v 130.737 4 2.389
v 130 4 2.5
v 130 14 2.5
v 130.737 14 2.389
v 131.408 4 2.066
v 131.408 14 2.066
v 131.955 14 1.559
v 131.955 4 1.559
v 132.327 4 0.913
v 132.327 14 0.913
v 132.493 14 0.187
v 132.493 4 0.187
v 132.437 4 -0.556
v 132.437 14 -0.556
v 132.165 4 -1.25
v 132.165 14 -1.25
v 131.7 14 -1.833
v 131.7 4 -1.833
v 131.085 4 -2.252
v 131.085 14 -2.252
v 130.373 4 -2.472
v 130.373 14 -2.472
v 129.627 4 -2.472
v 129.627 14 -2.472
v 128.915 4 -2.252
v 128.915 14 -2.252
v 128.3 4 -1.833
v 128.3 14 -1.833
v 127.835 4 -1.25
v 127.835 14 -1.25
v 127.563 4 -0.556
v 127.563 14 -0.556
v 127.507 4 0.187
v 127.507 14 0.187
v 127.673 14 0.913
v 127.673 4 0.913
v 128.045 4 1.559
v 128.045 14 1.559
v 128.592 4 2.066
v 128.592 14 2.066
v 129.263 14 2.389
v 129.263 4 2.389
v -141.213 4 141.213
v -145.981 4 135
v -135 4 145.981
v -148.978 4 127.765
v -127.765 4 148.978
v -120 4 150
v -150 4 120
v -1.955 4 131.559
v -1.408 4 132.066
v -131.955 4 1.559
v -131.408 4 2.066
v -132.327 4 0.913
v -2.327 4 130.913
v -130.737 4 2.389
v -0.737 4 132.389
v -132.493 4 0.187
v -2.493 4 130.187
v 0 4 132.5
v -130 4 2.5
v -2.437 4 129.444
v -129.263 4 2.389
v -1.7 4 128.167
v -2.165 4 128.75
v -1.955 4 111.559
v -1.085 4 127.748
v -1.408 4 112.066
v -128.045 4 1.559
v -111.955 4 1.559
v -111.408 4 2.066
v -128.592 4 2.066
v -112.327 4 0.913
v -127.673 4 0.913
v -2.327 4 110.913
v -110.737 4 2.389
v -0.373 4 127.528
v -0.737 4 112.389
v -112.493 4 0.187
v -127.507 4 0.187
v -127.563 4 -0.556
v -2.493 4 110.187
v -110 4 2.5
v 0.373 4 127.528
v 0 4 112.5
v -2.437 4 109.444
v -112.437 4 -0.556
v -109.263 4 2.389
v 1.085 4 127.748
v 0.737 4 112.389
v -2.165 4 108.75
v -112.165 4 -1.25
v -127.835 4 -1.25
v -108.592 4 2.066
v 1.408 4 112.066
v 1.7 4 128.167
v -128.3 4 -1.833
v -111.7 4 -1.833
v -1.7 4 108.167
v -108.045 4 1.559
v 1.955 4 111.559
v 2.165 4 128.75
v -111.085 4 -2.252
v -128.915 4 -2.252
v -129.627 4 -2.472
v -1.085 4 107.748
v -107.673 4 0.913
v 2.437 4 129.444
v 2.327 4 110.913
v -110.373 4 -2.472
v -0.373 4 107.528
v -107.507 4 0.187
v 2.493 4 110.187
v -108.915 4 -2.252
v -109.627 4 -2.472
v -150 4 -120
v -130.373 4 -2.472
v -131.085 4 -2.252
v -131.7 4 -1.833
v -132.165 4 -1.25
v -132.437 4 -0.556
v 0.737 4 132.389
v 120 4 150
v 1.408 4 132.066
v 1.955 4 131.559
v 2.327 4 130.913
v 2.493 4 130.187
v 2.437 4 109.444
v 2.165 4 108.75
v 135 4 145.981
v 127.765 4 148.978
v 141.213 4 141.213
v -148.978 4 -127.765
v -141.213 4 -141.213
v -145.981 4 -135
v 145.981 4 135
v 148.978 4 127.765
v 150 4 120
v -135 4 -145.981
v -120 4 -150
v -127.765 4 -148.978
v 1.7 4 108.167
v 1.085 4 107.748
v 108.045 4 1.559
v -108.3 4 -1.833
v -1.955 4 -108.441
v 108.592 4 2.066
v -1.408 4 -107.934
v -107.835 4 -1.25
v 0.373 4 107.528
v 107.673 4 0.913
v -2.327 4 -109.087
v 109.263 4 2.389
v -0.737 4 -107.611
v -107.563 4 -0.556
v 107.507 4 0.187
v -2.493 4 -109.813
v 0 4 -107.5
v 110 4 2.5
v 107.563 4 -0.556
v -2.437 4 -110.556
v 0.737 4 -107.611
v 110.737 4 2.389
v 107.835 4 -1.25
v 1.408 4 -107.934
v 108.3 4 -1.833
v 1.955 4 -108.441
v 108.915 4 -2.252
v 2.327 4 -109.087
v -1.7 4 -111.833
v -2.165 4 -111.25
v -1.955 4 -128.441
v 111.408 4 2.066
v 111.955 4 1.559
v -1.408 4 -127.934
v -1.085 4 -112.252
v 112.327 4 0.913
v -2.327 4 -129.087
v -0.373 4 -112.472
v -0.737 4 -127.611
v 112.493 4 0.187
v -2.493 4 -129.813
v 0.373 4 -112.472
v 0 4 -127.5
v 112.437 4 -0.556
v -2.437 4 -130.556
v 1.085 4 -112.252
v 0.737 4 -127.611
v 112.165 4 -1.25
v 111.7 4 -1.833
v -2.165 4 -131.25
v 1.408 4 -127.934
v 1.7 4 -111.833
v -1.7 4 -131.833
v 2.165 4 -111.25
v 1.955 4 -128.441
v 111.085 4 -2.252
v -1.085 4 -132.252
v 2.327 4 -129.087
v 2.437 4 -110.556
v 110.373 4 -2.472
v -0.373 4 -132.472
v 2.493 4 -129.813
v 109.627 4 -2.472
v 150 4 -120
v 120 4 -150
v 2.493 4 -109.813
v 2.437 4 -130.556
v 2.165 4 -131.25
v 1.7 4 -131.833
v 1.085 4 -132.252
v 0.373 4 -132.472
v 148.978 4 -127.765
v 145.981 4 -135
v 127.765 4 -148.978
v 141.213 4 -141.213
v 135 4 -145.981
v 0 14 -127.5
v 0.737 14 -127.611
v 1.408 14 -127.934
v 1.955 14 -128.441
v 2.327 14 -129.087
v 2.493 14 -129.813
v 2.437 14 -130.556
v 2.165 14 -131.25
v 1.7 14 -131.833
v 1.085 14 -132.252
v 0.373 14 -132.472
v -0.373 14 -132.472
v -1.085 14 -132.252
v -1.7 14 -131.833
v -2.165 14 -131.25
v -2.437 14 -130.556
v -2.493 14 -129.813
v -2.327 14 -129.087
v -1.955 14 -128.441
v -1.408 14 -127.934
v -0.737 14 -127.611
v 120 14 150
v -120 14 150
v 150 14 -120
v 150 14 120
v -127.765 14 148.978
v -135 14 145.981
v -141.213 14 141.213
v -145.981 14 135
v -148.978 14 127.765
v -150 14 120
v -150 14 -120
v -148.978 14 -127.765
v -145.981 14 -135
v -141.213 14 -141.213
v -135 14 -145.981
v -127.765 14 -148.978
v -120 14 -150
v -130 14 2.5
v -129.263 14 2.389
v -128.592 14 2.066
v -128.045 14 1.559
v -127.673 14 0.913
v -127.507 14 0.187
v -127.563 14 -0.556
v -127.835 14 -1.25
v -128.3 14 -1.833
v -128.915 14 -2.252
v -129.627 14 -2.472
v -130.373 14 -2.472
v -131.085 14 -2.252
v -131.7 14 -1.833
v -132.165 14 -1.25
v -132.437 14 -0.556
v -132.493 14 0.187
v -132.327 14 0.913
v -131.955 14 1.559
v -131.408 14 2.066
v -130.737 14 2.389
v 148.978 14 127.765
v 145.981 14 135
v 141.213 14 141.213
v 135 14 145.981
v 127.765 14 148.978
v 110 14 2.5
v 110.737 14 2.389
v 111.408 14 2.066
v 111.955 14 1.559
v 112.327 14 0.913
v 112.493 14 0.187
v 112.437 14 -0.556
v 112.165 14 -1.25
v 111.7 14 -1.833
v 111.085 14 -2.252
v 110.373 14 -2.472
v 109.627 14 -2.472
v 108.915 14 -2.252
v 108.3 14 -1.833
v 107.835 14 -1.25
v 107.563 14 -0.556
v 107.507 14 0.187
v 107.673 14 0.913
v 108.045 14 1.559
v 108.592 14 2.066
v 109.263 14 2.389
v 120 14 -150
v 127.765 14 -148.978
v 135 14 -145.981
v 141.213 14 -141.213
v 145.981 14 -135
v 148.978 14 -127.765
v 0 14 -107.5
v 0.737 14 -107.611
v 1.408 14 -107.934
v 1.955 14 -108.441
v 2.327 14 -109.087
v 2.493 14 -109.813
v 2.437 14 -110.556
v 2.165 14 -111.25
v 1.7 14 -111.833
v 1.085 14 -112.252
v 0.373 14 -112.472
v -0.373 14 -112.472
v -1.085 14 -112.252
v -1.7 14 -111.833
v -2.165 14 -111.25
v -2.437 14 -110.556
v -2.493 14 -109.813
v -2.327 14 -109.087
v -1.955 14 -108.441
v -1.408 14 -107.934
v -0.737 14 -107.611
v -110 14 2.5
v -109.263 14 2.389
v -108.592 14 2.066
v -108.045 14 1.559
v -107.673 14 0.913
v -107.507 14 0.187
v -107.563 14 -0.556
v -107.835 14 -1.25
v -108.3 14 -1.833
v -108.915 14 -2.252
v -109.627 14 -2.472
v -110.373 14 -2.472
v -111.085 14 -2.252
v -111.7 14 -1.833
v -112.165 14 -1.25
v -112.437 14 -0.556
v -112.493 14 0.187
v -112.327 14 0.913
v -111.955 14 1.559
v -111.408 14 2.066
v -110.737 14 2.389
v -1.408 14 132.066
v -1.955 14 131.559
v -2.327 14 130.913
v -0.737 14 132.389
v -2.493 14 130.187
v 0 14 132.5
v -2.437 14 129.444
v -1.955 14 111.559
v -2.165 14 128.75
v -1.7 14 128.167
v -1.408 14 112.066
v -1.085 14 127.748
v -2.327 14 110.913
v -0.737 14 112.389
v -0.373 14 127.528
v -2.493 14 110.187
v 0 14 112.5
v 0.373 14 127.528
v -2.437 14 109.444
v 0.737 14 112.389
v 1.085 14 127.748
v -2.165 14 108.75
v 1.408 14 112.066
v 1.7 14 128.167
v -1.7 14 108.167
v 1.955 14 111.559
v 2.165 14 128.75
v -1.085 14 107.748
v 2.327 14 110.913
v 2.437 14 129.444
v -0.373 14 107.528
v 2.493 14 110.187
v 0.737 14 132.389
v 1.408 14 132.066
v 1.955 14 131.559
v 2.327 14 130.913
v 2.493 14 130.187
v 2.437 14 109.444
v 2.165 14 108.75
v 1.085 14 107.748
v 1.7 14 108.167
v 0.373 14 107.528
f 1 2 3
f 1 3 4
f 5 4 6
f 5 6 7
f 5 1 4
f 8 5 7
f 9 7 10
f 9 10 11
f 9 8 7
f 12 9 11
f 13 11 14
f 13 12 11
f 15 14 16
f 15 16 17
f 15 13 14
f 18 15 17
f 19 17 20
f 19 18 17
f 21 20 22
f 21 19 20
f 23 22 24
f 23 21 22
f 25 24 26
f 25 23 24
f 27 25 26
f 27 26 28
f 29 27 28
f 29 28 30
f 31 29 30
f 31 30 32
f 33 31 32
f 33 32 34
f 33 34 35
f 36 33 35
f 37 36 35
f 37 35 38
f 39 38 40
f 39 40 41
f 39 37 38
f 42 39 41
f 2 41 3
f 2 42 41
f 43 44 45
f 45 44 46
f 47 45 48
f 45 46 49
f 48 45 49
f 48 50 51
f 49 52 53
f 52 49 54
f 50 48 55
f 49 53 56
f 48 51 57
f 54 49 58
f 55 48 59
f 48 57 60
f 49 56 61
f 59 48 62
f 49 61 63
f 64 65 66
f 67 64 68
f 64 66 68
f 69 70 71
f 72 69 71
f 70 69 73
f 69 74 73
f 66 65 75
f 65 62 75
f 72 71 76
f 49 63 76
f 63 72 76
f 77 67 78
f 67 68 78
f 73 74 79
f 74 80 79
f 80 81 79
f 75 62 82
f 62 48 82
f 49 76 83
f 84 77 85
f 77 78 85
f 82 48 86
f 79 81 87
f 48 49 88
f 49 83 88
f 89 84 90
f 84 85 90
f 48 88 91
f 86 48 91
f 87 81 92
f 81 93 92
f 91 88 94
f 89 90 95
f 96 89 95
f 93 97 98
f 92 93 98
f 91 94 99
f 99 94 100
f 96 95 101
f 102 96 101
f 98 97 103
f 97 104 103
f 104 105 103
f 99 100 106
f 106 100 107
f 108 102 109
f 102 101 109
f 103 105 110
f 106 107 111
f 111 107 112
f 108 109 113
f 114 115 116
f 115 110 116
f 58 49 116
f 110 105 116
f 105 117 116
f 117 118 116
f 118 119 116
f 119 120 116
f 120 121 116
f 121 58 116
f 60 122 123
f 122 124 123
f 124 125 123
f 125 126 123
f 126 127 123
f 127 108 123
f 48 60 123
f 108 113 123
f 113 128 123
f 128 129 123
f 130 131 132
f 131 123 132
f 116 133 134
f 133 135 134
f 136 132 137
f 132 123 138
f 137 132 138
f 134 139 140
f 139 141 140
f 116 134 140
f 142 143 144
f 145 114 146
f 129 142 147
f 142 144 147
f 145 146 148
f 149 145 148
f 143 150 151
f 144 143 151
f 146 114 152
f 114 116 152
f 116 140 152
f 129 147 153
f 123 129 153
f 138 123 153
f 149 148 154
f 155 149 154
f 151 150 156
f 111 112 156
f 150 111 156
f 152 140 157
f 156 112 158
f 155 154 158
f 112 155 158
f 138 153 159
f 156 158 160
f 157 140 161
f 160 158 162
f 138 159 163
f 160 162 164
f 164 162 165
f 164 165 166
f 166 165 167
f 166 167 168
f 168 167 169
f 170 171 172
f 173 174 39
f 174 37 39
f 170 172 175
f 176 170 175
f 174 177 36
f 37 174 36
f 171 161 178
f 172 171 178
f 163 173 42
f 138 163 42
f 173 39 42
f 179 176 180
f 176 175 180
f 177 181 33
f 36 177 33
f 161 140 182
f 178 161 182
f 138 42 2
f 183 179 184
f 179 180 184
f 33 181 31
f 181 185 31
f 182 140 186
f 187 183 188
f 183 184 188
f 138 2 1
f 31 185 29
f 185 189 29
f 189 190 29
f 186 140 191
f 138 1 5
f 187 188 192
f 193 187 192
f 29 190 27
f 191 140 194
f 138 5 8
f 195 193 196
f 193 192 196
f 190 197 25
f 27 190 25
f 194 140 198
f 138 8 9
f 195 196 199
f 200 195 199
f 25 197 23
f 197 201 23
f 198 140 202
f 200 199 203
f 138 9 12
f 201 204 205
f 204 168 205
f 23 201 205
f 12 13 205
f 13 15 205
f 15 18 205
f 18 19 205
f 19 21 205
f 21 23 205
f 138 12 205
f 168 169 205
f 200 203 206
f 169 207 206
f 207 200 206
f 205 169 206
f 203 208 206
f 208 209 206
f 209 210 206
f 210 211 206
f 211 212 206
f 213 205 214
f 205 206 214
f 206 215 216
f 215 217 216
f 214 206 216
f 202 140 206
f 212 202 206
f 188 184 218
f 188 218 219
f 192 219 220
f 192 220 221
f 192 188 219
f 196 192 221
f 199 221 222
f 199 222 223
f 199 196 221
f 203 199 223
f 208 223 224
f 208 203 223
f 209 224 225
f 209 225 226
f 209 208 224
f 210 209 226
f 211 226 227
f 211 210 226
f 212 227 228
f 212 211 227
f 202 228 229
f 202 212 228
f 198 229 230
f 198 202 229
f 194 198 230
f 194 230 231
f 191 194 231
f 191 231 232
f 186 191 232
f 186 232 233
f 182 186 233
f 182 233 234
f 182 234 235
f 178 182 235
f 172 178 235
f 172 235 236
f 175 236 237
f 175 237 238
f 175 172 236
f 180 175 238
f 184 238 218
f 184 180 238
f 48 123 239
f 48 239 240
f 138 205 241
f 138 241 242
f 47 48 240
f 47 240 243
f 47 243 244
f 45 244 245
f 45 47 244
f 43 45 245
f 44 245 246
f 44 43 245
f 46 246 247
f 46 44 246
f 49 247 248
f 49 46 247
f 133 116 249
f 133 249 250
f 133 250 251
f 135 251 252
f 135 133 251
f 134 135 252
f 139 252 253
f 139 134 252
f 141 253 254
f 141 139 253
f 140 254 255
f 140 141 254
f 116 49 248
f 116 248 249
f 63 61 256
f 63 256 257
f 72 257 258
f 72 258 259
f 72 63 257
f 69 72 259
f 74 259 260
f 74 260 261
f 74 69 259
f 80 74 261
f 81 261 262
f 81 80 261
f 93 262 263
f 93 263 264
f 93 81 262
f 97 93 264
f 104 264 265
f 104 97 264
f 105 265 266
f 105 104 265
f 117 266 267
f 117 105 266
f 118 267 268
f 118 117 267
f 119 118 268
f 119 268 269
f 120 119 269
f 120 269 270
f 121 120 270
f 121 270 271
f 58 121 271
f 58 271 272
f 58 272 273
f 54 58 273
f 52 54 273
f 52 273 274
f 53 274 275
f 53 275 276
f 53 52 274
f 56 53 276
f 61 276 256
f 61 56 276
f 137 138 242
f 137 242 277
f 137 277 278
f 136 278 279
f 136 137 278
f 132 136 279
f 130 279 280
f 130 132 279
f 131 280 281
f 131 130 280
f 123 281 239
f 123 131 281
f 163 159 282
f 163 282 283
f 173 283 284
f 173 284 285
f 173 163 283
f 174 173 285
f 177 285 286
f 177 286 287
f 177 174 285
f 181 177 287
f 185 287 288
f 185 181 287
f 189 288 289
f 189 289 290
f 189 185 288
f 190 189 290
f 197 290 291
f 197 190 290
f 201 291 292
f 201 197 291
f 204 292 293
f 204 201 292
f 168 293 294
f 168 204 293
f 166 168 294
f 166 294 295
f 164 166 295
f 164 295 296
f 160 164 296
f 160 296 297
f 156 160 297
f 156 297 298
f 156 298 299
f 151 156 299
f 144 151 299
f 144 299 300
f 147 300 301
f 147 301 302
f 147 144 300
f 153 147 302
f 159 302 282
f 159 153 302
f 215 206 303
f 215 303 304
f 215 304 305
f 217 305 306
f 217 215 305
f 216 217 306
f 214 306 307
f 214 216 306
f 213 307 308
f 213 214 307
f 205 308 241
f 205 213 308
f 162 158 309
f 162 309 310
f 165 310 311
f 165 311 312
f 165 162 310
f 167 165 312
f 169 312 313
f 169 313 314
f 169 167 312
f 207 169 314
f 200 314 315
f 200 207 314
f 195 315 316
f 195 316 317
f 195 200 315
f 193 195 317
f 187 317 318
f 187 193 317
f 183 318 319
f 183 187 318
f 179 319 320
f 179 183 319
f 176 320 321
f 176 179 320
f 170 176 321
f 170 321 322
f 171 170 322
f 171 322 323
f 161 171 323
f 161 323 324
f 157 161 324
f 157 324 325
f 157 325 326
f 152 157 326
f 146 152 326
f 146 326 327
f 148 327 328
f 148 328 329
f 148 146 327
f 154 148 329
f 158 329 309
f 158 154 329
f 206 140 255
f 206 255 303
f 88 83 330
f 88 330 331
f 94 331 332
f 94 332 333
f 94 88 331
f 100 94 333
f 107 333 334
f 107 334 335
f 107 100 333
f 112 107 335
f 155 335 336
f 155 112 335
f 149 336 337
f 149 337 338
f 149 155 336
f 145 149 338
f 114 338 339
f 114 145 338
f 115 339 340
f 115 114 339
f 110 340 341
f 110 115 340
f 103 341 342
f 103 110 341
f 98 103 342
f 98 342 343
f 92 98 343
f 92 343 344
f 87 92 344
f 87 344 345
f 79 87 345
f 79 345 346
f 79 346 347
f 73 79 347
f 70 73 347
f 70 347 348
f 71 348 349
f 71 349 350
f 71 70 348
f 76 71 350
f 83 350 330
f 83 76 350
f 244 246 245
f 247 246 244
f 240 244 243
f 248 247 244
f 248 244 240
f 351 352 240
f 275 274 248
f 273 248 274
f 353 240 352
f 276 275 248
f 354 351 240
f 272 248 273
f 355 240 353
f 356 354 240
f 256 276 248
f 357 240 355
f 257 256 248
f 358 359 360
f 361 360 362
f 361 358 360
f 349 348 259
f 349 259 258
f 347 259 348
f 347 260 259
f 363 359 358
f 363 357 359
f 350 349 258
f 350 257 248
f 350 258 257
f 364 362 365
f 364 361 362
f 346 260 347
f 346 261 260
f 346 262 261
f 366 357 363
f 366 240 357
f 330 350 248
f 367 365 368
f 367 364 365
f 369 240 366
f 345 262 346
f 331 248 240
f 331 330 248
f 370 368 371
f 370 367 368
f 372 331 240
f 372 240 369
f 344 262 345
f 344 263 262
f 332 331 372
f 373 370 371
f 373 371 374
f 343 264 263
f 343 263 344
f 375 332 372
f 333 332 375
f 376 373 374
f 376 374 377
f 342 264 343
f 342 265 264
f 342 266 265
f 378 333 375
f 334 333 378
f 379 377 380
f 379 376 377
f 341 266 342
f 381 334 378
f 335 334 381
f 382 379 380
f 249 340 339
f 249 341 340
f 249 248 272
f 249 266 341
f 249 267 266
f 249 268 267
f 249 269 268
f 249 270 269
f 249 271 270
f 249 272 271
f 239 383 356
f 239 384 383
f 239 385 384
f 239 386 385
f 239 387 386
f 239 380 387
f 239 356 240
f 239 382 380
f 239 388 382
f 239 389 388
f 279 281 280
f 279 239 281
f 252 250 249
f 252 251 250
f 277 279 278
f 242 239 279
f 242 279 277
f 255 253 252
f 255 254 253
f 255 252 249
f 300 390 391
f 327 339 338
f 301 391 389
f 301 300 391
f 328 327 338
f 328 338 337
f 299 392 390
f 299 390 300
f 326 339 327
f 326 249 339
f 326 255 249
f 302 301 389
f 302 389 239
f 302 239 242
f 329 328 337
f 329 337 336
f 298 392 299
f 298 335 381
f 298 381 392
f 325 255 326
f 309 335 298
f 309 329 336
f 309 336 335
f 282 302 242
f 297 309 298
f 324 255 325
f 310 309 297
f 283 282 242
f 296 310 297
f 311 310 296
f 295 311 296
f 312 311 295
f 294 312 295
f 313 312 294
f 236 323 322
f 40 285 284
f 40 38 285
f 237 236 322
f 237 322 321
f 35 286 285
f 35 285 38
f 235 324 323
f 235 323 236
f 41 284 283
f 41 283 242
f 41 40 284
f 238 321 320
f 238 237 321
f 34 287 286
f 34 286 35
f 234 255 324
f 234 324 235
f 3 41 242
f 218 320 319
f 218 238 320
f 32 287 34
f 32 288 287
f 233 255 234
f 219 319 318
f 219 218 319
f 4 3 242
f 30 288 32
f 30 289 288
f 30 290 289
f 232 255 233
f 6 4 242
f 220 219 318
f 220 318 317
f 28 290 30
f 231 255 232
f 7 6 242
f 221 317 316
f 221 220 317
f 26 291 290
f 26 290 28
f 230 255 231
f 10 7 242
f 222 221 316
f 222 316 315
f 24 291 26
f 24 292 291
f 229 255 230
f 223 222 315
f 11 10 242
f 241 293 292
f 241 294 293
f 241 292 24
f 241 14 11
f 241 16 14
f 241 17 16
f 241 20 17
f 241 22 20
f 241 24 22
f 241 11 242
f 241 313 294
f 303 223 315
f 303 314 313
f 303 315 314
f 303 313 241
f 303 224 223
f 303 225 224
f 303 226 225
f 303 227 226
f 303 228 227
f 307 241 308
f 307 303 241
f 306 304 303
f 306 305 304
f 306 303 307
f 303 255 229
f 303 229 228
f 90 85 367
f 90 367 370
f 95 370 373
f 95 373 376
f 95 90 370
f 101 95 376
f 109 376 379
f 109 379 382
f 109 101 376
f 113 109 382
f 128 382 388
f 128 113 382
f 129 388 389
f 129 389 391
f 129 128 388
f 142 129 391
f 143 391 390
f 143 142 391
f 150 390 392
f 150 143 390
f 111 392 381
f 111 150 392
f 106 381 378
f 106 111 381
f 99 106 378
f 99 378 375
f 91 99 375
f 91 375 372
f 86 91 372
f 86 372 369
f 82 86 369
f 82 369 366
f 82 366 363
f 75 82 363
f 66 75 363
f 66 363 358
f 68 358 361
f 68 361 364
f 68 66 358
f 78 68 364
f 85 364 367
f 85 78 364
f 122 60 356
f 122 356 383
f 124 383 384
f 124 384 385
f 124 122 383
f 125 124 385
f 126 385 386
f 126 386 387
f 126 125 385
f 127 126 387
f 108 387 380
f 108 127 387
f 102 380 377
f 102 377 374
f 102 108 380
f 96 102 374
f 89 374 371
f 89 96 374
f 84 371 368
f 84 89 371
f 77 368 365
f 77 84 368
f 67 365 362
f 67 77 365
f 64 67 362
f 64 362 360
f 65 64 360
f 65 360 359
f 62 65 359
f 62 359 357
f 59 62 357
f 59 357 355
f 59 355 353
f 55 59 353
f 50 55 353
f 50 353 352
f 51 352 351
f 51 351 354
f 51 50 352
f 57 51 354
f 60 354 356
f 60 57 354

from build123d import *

# Parameters (mm, degrees)
BOSS_EXTRUDE3_DEPTH = 4
SKETCH2_R           = 2.5
BOSS_EXTRUDE4_DEPTH = 10
CUT_EXTRUDE1_DEPTH  = 52
SKETCH4_W           = 171.868784408
SKETCH4_H           = 181.506286336
BOSS_EXTRUDE5_DEPTH = 10


with BuildPart() as part:
    # Sketch1 → Boss-Extrude3 (new body)
    with BuildSketch(Plane(origin=(0, 0, 0), x_dir=(1, 0, 0), z_dir=(0, 1, 0))):
        with BuildLine():
            ThreePointArc((-75, -60), (-70.606601718, -70.606601718), (-60, -75))
            Line((-60, -75), (60, -75))
            ThreePointArc((60, -75), (70.606601718, -70.606601718), (75, -60))
            Line((75, -60), (75, 60))
            ThreePointArc((75, 60), (70.606601718, 70.606601718), (60, 75))
            Line((60, 75), (-60, 75))
            ThreePointArc((-60, 75), (-70.606601718, 70.606601718), (-75, 60))
            Line((-75, 60), (-75, -60))
        make_face()
    extrude(amount=BOSS_EXTRUDE3_DEPTH)

    # Sketch3 → Cut-Extrude1 (cut)
    with BuildSketch(Plane(origin=(0, 14, 0), x_dir=(1, 0, 0), z_dir=(0, 1, 0))):
        with BuildLine():
            Line((-60, 76), (60, 76))
            ThreePointArc((60, 76), (71.313708499, 71.313708499), (76, 60))
            Line((76, 60), (76, -60))
            ThreePointArc((76, -60), (71.313708499, -71.313708499), (60, -76))
            Line((60, -76), (-60, -76))
            ThreePointArc((-60, -76), (-71.313708499, -71.313708499), (-76, -60))
            Line((-76, -60), (-76, 60))
            ThreePointArc((-76, 60), (-71.313708499, 71.313708499), (-60, 76))
        make_face()
    extrude(amount=-CUT_EXTRUDE1_DEPTH, mode=Mode.SUBTRACT)


with BuildPart() as body_2:
    # Sketch2 → Boss-Extrude4 (new body)
    # profile 1 of 5: a face of its own
    with BuildSketch(Plane(origin=(0, 4, 0), x_dir=(1, 0, 0), z_dir=(0, 1, 0))):
        with BuildLine():
            ThreePointArc((150, -120), (141.213203436, -141.213203436), (120, -150))
            Line((120, -150), (-120, -150))
            ThreePointArc((-120, -150), (-141.213203436, -141.213203436), (-150, -120))
            Line((-150, -120), (-150, 120))
            ThreePointArc((-150, 120), (-141.213203436, 141.213203436), (-120, 150))
            Line((-120, 150), (120, 150))
            ThreePointArc((120, 150), (141.213203436, 141.213203436), (150, 120))
            Line((150, 120), (150, -120))
        make_face()
        with Locations(Location((-110, 0, 0), (0, 0, 270))):
            Circle(SKETCH2_R, mode=Mode.SUBTRACT)
        with Locations(Location((-130, 0, 0), (0, 0, 270))):
            Circle(SKETCH2_R, mode=Mode.SUBTRACT)
        with Locations(Location((130, 0, 0), (0, 0, 270))):
            Circle(SKETCH2_R, mode=Mode.SUBTRACT)
        with Locations(Location((110, 0, 0), (0, 0, 270))):
            Circle(SKETCH2_R, mode=Mode.SUBTRACT)
        with Locations(Location((0, -130, 0), (0, 0, 270))):
            Circle(SKETCH2_R, mode=Mode.SUBTRACT)
        with Locations(Location((0, -110, 0), (0, 0, 270))):
            Circle(SKETCH2_R, mode=Mode.SUBTRACT)
        with Locations(Location((0, 110, 0), (0, 0, 270))):
            Circle(SKETCH2_R, mode=Mode.SUBTRACT)
        with Locations(Location((0, 130, 0), (0, 0, 270))):
            Circle(SKETCH2_R, mode=Mode.SUBTRACT)
        Polygon((-76, -76), (-76, 76), (0, 76), (76, 76), (76, -76), align=None, mode=Mode.SUBTRACT)
    # profile 2 of 5: a face of its own
    with BuildSketch(Plane(origin=(0, 4, 0), x_dir=(1, 0, 0), z_dir=(0, 1, 0))):
        with BuildLine():
            ThreePointArc((-60, -76), (-71.313708499, -71.313708499), (-76, -60))
            Line((-76, -60), (-76, -76))
            Line((-76, -76), (-60, -76))
        make_face()
    # profile 3 of 5: a face of its own
    with BuildSketch(Plane(origin=(0, 4, 0), x_dir=(1, 0, 0), z_dir=(0, 1, 0))):
        with BuildLine():
            Line((76, -76), (76, -60))
            ThreePointArc((76, -60), (71.313708499, -71.313708499), (60, -76))
            Line((60, -76), (76, -76))
        make_face()
    # profile 4 of 5: a face of its own
    with BuildSketch(Plane(origin=(0, 4, 0), x_dir=(1, 0, 0), z_dir=(0, 1, 0))):
        with BuildLine():
            Line((76, 76), (60, 76))
            ThreePointArc((60, 76), (71.313708499, 71.313708499), (76, 60))
            Line((76, 60), (76, 76))
        make_face()
    # profile 5 of 5: a face of its own
    with BuildSketch(Plane(origin=(0, 4, 0), x_dir=(1, 0, 0), z_dir=(0, 1, 0))):
        with BuildLine():
            ThreePointArc((-76, 60), (-71.313708499, 71.313708499), (-60, 76))
            Line((-60, 76), (-76, 76))
            Line((-76, 76), (-76, 60))
        make_face()
    extrude(amount=BOSS_EXTRUDE4_DEPTH)

    # Sketch4 → Boss-Extrude5 (add)
    with BuildSketch(Plane(origin=(0, 14, 0), x_dir=(1, 0, 0), z_dir=(0, 1, 0))):
        Rectangle(SKETCH4_W, SKETCH4_H)
    extrude(amount=-BOSS_EXTRUDE5_DEPTH)


solid = body_2.part
